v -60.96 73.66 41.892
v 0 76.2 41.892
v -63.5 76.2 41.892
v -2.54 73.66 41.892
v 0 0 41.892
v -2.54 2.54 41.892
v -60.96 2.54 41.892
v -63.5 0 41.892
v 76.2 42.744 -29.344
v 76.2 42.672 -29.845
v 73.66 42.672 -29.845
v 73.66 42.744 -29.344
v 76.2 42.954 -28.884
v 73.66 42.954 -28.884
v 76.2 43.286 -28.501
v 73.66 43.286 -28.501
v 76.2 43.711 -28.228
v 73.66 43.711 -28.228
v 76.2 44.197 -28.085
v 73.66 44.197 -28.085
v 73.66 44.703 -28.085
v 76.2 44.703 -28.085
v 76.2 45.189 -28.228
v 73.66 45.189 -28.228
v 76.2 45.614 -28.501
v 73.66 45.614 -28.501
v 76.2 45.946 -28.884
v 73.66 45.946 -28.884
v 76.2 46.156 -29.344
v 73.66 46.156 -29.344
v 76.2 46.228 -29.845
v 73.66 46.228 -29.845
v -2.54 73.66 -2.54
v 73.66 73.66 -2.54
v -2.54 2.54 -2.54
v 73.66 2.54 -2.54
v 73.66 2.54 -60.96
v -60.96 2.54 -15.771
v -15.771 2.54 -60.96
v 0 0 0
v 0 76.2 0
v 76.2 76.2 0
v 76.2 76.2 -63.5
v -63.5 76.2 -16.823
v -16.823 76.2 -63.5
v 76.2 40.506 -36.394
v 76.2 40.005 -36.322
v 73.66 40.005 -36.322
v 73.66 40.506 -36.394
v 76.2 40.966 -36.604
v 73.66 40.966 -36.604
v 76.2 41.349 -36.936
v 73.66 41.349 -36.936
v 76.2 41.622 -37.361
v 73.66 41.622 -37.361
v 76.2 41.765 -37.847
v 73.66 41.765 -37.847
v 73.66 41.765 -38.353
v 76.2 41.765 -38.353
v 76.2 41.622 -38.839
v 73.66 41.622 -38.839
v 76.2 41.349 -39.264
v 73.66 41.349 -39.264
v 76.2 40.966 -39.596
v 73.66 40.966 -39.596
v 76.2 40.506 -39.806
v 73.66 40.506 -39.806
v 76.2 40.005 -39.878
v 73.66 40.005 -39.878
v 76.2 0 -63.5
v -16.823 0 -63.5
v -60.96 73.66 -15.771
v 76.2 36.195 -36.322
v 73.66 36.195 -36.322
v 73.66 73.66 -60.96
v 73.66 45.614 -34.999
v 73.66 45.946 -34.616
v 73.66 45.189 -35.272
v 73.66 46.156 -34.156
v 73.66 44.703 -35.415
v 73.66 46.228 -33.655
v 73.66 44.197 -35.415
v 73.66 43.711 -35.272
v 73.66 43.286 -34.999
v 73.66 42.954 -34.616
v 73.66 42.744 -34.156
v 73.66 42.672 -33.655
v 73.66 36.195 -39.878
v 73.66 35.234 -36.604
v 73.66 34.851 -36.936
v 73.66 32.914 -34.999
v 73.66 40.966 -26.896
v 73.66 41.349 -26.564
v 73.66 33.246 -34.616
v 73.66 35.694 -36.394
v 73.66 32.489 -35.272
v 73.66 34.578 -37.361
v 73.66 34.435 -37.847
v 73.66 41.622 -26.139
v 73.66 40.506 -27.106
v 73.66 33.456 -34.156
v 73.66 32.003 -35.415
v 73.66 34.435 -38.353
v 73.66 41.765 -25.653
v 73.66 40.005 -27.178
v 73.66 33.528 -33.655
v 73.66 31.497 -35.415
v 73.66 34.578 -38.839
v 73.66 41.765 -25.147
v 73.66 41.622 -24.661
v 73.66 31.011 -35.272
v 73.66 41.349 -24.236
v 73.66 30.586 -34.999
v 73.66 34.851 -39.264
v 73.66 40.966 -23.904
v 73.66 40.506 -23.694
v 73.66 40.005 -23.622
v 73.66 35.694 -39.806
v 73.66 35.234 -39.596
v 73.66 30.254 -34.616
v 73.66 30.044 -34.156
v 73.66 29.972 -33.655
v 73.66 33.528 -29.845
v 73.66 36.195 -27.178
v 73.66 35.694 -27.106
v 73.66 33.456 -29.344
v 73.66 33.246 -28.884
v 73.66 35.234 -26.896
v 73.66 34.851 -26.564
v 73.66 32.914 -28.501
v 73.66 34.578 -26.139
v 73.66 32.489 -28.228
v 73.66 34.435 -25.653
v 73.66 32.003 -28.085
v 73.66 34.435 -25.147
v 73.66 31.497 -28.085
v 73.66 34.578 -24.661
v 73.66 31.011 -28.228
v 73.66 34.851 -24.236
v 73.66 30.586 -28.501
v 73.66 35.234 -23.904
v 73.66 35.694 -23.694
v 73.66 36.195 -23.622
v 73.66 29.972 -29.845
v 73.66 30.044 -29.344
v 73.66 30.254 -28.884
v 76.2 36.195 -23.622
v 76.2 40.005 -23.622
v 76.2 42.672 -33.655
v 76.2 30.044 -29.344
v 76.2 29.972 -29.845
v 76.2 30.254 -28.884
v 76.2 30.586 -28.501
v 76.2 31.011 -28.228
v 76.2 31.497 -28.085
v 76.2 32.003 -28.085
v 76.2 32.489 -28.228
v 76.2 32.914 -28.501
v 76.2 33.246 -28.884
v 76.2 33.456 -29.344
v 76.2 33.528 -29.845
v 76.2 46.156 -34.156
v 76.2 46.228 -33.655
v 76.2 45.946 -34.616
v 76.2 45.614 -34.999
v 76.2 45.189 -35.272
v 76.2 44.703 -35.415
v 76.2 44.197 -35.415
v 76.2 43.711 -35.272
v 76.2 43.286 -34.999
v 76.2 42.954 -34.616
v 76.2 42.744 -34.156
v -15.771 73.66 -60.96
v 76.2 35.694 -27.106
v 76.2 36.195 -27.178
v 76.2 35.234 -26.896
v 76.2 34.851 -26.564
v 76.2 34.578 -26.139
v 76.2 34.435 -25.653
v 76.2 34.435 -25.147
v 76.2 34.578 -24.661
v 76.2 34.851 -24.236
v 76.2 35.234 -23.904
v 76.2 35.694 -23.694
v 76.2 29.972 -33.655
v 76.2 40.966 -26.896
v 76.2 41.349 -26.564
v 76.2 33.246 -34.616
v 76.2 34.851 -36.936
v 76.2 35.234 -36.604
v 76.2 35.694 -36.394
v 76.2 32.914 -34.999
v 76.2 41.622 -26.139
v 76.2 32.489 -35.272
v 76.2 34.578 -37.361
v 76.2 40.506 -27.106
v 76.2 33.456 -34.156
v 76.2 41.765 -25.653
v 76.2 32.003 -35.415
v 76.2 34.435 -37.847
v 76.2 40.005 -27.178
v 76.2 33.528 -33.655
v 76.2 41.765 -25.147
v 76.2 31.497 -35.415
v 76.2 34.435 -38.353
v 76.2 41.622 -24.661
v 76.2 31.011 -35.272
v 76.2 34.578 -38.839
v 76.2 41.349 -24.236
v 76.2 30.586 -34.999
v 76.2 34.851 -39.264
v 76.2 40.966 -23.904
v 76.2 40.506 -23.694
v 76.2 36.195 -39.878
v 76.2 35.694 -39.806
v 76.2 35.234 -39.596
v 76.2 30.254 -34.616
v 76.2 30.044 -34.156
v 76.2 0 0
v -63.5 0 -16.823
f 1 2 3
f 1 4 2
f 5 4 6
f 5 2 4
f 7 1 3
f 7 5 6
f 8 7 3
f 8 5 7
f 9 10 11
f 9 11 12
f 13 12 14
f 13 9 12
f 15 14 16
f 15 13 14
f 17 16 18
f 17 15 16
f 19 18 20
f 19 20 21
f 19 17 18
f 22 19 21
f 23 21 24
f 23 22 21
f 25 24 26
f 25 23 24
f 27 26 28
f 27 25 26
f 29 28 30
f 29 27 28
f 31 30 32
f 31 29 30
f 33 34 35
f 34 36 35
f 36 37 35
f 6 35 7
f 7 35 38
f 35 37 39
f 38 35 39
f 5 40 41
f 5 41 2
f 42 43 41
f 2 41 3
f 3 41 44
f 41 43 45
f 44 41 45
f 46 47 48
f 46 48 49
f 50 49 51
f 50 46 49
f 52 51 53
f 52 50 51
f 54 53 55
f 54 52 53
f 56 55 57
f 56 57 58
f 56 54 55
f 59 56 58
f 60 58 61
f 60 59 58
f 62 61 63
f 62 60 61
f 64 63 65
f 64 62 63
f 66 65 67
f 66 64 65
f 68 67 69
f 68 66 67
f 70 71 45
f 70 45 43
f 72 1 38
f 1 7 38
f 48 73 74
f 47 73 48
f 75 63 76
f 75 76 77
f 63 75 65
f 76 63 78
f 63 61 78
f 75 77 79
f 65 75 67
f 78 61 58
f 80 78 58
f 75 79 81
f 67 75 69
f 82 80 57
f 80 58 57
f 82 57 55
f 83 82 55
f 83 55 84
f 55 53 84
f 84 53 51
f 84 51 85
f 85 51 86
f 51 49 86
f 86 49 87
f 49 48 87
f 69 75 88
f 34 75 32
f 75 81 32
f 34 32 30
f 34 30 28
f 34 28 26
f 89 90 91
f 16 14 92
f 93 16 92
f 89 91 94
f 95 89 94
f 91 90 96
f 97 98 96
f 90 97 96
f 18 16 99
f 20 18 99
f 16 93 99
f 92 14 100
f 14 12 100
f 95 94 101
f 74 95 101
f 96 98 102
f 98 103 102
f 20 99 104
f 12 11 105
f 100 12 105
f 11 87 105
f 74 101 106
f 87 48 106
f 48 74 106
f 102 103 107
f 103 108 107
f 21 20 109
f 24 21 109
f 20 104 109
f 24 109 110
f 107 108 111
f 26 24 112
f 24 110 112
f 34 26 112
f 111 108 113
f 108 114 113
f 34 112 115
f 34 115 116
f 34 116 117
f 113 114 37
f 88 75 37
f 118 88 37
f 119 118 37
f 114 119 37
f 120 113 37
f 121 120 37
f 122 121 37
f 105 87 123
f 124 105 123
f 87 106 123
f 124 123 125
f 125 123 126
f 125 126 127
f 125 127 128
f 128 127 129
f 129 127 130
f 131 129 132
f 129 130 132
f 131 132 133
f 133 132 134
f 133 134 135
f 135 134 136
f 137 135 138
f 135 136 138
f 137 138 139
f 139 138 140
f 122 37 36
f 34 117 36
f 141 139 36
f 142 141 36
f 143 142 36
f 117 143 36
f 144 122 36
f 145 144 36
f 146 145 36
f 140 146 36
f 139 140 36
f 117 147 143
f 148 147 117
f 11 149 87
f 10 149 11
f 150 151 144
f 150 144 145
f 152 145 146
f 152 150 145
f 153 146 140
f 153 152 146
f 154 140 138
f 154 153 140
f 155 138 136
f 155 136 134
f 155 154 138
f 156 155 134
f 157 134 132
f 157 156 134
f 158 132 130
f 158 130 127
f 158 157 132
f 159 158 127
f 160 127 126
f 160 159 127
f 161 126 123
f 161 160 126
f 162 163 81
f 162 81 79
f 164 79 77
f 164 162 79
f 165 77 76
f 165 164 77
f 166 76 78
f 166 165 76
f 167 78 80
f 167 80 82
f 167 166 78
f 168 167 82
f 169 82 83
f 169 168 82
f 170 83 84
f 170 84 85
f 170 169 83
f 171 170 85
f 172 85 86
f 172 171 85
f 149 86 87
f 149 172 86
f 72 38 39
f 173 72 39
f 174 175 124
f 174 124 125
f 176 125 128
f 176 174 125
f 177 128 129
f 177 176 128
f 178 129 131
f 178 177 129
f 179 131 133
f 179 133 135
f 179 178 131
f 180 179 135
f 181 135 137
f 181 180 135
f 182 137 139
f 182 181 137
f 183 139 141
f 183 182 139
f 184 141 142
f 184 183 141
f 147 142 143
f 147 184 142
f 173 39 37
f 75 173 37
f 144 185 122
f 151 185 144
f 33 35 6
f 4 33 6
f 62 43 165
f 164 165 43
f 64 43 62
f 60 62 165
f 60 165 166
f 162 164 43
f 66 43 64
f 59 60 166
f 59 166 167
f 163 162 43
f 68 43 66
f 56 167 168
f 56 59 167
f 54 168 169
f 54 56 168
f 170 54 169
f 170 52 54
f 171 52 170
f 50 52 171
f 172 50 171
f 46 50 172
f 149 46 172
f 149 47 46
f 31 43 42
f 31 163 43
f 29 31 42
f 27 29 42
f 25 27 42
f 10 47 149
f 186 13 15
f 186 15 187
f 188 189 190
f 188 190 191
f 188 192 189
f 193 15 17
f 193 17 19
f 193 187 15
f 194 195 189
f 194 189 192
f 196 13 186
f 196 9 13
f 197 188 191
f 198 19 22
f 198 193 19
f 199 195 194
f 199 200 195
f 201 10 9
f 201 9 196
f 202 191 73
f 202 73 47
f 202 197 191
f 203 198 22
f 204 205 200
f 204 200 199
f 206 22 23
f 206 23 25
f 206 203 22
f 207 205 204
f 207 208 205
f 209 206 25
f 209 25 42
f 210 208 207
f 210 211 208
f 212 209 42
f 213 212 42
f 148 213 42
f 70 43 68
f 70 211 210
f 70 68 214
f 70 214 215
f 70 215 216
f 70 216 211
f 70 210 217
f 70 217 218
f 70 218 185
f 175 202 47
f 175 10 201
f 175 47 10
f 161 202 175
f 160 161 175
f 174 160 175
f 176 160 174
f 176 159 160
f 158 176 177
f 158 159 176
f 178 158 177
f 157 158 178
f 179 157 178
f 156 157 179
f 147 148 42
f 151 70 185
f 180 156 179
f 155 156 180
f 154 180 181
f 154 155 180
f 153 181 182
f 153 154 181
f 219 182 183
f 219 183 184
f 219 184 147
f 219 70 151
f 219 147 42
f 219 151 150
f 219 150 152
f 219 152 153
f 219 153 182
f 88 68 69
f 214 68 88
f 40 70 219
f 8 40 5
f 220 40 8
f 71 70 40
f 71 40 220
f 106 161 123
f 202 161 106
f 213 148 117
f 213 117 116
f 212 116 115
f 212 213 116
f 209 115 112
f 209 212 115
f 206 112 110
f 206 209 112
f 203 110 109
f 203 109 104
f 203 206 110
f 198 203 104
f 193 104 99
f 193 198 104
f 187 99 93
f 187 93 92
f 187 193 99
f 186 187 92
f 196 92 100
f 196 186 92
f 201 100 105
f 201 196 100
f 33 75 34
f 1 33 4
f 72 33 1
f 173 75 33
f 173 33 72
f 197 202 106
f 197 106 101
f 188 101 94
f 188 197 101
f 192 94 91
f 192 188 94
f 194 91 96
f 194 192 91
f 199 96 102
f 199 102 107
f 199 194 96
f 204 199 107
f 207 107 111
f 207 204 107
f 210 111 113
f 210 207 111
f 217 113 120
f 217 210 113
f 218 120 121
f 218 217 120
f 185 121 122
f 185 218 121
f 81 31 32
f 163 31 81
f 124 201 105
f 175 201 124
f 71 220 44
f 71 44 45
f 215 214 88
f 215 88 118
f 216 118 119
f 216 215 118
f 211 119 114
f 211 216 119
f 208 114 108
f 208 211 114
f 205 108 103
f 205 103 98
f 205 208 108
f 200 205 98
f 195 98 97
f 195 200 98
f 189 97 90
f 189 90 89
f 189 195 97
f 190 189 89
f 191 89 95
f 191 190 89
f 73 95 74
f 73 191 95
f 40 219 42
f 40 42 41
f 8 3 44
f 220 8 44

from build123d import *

# Parameters (mm, degrees)
BOSS_EXTRUDE1_DEPTH = 76.2
SHELL1_T            = -2.54
CUT_EXTRUDE1_DEPTH  = 2.54
CIRPATTERN1_COUNT   = 4


with BuildPart() as part:
    # Sketch1 → Boss-Extrude1 (new body)
    with BuildSketch(Plane(origin=(0, 0, 0), x_dir=(1, 0, 0), z_dir=(0, 1, 0))):
        Polygon((0, 0), (0, -41.892312512), (-63.5, -41.892312512), (-63.5, 16.822913885), (-16.822913885, 63.5), (76.2, 63.5), (76.2, 0), align=None)
    extrude(amount=BOSS_EXTRUDE1_DEPTH)

    # Shell1
    shell1_openings = [part.faces().sort_by_distance(p)[0] for p in [
        (-31.75, 38.1, 41.892312512),
    ]]
    offset(amount=SHELL1_T, openings=shell1_openings, kind=Kind.INTERSECTION)

    # Sketch4 → Cut-Extrude1 (cut)
    with BuildSketch(Plane(origin=(76.2, 0, 0), x_dir=(0, 0, -1), z_dir=(1, 0, 0))):
        with BuildLine():
            Line((29.845, 46.228), (33.655, 46.228))
            ThreePointArc((33.655, 46.228), (35.433, 44.45), (33.655, 42.672))
            Line((33.655, 42.672), (29.845, 42.672))
            ThreePointArc((29.845, 42.672), (28.067, 44.45), (29.845, 46.228))
        make_face()
    cut_extrude1 = extrude(amount=-CUT_EXTRUDE1_DEPTH, mode=Mode.SUBTRACT)

    # CirPattern1: Cut-Extrude1 ×4 about axis
    cirpattern1_axis = Axis((76.2, 38.1, -31.75), (1, 0, 0))
    for i in range(1, CIRPATTERN1_COUNT):
        add(cut_extrude1.rotate(cirpattern1_axis, i * 360 / CIRPATTERN1_COUNT), mode=Mode.SUBTRACT)


solid = part.part
